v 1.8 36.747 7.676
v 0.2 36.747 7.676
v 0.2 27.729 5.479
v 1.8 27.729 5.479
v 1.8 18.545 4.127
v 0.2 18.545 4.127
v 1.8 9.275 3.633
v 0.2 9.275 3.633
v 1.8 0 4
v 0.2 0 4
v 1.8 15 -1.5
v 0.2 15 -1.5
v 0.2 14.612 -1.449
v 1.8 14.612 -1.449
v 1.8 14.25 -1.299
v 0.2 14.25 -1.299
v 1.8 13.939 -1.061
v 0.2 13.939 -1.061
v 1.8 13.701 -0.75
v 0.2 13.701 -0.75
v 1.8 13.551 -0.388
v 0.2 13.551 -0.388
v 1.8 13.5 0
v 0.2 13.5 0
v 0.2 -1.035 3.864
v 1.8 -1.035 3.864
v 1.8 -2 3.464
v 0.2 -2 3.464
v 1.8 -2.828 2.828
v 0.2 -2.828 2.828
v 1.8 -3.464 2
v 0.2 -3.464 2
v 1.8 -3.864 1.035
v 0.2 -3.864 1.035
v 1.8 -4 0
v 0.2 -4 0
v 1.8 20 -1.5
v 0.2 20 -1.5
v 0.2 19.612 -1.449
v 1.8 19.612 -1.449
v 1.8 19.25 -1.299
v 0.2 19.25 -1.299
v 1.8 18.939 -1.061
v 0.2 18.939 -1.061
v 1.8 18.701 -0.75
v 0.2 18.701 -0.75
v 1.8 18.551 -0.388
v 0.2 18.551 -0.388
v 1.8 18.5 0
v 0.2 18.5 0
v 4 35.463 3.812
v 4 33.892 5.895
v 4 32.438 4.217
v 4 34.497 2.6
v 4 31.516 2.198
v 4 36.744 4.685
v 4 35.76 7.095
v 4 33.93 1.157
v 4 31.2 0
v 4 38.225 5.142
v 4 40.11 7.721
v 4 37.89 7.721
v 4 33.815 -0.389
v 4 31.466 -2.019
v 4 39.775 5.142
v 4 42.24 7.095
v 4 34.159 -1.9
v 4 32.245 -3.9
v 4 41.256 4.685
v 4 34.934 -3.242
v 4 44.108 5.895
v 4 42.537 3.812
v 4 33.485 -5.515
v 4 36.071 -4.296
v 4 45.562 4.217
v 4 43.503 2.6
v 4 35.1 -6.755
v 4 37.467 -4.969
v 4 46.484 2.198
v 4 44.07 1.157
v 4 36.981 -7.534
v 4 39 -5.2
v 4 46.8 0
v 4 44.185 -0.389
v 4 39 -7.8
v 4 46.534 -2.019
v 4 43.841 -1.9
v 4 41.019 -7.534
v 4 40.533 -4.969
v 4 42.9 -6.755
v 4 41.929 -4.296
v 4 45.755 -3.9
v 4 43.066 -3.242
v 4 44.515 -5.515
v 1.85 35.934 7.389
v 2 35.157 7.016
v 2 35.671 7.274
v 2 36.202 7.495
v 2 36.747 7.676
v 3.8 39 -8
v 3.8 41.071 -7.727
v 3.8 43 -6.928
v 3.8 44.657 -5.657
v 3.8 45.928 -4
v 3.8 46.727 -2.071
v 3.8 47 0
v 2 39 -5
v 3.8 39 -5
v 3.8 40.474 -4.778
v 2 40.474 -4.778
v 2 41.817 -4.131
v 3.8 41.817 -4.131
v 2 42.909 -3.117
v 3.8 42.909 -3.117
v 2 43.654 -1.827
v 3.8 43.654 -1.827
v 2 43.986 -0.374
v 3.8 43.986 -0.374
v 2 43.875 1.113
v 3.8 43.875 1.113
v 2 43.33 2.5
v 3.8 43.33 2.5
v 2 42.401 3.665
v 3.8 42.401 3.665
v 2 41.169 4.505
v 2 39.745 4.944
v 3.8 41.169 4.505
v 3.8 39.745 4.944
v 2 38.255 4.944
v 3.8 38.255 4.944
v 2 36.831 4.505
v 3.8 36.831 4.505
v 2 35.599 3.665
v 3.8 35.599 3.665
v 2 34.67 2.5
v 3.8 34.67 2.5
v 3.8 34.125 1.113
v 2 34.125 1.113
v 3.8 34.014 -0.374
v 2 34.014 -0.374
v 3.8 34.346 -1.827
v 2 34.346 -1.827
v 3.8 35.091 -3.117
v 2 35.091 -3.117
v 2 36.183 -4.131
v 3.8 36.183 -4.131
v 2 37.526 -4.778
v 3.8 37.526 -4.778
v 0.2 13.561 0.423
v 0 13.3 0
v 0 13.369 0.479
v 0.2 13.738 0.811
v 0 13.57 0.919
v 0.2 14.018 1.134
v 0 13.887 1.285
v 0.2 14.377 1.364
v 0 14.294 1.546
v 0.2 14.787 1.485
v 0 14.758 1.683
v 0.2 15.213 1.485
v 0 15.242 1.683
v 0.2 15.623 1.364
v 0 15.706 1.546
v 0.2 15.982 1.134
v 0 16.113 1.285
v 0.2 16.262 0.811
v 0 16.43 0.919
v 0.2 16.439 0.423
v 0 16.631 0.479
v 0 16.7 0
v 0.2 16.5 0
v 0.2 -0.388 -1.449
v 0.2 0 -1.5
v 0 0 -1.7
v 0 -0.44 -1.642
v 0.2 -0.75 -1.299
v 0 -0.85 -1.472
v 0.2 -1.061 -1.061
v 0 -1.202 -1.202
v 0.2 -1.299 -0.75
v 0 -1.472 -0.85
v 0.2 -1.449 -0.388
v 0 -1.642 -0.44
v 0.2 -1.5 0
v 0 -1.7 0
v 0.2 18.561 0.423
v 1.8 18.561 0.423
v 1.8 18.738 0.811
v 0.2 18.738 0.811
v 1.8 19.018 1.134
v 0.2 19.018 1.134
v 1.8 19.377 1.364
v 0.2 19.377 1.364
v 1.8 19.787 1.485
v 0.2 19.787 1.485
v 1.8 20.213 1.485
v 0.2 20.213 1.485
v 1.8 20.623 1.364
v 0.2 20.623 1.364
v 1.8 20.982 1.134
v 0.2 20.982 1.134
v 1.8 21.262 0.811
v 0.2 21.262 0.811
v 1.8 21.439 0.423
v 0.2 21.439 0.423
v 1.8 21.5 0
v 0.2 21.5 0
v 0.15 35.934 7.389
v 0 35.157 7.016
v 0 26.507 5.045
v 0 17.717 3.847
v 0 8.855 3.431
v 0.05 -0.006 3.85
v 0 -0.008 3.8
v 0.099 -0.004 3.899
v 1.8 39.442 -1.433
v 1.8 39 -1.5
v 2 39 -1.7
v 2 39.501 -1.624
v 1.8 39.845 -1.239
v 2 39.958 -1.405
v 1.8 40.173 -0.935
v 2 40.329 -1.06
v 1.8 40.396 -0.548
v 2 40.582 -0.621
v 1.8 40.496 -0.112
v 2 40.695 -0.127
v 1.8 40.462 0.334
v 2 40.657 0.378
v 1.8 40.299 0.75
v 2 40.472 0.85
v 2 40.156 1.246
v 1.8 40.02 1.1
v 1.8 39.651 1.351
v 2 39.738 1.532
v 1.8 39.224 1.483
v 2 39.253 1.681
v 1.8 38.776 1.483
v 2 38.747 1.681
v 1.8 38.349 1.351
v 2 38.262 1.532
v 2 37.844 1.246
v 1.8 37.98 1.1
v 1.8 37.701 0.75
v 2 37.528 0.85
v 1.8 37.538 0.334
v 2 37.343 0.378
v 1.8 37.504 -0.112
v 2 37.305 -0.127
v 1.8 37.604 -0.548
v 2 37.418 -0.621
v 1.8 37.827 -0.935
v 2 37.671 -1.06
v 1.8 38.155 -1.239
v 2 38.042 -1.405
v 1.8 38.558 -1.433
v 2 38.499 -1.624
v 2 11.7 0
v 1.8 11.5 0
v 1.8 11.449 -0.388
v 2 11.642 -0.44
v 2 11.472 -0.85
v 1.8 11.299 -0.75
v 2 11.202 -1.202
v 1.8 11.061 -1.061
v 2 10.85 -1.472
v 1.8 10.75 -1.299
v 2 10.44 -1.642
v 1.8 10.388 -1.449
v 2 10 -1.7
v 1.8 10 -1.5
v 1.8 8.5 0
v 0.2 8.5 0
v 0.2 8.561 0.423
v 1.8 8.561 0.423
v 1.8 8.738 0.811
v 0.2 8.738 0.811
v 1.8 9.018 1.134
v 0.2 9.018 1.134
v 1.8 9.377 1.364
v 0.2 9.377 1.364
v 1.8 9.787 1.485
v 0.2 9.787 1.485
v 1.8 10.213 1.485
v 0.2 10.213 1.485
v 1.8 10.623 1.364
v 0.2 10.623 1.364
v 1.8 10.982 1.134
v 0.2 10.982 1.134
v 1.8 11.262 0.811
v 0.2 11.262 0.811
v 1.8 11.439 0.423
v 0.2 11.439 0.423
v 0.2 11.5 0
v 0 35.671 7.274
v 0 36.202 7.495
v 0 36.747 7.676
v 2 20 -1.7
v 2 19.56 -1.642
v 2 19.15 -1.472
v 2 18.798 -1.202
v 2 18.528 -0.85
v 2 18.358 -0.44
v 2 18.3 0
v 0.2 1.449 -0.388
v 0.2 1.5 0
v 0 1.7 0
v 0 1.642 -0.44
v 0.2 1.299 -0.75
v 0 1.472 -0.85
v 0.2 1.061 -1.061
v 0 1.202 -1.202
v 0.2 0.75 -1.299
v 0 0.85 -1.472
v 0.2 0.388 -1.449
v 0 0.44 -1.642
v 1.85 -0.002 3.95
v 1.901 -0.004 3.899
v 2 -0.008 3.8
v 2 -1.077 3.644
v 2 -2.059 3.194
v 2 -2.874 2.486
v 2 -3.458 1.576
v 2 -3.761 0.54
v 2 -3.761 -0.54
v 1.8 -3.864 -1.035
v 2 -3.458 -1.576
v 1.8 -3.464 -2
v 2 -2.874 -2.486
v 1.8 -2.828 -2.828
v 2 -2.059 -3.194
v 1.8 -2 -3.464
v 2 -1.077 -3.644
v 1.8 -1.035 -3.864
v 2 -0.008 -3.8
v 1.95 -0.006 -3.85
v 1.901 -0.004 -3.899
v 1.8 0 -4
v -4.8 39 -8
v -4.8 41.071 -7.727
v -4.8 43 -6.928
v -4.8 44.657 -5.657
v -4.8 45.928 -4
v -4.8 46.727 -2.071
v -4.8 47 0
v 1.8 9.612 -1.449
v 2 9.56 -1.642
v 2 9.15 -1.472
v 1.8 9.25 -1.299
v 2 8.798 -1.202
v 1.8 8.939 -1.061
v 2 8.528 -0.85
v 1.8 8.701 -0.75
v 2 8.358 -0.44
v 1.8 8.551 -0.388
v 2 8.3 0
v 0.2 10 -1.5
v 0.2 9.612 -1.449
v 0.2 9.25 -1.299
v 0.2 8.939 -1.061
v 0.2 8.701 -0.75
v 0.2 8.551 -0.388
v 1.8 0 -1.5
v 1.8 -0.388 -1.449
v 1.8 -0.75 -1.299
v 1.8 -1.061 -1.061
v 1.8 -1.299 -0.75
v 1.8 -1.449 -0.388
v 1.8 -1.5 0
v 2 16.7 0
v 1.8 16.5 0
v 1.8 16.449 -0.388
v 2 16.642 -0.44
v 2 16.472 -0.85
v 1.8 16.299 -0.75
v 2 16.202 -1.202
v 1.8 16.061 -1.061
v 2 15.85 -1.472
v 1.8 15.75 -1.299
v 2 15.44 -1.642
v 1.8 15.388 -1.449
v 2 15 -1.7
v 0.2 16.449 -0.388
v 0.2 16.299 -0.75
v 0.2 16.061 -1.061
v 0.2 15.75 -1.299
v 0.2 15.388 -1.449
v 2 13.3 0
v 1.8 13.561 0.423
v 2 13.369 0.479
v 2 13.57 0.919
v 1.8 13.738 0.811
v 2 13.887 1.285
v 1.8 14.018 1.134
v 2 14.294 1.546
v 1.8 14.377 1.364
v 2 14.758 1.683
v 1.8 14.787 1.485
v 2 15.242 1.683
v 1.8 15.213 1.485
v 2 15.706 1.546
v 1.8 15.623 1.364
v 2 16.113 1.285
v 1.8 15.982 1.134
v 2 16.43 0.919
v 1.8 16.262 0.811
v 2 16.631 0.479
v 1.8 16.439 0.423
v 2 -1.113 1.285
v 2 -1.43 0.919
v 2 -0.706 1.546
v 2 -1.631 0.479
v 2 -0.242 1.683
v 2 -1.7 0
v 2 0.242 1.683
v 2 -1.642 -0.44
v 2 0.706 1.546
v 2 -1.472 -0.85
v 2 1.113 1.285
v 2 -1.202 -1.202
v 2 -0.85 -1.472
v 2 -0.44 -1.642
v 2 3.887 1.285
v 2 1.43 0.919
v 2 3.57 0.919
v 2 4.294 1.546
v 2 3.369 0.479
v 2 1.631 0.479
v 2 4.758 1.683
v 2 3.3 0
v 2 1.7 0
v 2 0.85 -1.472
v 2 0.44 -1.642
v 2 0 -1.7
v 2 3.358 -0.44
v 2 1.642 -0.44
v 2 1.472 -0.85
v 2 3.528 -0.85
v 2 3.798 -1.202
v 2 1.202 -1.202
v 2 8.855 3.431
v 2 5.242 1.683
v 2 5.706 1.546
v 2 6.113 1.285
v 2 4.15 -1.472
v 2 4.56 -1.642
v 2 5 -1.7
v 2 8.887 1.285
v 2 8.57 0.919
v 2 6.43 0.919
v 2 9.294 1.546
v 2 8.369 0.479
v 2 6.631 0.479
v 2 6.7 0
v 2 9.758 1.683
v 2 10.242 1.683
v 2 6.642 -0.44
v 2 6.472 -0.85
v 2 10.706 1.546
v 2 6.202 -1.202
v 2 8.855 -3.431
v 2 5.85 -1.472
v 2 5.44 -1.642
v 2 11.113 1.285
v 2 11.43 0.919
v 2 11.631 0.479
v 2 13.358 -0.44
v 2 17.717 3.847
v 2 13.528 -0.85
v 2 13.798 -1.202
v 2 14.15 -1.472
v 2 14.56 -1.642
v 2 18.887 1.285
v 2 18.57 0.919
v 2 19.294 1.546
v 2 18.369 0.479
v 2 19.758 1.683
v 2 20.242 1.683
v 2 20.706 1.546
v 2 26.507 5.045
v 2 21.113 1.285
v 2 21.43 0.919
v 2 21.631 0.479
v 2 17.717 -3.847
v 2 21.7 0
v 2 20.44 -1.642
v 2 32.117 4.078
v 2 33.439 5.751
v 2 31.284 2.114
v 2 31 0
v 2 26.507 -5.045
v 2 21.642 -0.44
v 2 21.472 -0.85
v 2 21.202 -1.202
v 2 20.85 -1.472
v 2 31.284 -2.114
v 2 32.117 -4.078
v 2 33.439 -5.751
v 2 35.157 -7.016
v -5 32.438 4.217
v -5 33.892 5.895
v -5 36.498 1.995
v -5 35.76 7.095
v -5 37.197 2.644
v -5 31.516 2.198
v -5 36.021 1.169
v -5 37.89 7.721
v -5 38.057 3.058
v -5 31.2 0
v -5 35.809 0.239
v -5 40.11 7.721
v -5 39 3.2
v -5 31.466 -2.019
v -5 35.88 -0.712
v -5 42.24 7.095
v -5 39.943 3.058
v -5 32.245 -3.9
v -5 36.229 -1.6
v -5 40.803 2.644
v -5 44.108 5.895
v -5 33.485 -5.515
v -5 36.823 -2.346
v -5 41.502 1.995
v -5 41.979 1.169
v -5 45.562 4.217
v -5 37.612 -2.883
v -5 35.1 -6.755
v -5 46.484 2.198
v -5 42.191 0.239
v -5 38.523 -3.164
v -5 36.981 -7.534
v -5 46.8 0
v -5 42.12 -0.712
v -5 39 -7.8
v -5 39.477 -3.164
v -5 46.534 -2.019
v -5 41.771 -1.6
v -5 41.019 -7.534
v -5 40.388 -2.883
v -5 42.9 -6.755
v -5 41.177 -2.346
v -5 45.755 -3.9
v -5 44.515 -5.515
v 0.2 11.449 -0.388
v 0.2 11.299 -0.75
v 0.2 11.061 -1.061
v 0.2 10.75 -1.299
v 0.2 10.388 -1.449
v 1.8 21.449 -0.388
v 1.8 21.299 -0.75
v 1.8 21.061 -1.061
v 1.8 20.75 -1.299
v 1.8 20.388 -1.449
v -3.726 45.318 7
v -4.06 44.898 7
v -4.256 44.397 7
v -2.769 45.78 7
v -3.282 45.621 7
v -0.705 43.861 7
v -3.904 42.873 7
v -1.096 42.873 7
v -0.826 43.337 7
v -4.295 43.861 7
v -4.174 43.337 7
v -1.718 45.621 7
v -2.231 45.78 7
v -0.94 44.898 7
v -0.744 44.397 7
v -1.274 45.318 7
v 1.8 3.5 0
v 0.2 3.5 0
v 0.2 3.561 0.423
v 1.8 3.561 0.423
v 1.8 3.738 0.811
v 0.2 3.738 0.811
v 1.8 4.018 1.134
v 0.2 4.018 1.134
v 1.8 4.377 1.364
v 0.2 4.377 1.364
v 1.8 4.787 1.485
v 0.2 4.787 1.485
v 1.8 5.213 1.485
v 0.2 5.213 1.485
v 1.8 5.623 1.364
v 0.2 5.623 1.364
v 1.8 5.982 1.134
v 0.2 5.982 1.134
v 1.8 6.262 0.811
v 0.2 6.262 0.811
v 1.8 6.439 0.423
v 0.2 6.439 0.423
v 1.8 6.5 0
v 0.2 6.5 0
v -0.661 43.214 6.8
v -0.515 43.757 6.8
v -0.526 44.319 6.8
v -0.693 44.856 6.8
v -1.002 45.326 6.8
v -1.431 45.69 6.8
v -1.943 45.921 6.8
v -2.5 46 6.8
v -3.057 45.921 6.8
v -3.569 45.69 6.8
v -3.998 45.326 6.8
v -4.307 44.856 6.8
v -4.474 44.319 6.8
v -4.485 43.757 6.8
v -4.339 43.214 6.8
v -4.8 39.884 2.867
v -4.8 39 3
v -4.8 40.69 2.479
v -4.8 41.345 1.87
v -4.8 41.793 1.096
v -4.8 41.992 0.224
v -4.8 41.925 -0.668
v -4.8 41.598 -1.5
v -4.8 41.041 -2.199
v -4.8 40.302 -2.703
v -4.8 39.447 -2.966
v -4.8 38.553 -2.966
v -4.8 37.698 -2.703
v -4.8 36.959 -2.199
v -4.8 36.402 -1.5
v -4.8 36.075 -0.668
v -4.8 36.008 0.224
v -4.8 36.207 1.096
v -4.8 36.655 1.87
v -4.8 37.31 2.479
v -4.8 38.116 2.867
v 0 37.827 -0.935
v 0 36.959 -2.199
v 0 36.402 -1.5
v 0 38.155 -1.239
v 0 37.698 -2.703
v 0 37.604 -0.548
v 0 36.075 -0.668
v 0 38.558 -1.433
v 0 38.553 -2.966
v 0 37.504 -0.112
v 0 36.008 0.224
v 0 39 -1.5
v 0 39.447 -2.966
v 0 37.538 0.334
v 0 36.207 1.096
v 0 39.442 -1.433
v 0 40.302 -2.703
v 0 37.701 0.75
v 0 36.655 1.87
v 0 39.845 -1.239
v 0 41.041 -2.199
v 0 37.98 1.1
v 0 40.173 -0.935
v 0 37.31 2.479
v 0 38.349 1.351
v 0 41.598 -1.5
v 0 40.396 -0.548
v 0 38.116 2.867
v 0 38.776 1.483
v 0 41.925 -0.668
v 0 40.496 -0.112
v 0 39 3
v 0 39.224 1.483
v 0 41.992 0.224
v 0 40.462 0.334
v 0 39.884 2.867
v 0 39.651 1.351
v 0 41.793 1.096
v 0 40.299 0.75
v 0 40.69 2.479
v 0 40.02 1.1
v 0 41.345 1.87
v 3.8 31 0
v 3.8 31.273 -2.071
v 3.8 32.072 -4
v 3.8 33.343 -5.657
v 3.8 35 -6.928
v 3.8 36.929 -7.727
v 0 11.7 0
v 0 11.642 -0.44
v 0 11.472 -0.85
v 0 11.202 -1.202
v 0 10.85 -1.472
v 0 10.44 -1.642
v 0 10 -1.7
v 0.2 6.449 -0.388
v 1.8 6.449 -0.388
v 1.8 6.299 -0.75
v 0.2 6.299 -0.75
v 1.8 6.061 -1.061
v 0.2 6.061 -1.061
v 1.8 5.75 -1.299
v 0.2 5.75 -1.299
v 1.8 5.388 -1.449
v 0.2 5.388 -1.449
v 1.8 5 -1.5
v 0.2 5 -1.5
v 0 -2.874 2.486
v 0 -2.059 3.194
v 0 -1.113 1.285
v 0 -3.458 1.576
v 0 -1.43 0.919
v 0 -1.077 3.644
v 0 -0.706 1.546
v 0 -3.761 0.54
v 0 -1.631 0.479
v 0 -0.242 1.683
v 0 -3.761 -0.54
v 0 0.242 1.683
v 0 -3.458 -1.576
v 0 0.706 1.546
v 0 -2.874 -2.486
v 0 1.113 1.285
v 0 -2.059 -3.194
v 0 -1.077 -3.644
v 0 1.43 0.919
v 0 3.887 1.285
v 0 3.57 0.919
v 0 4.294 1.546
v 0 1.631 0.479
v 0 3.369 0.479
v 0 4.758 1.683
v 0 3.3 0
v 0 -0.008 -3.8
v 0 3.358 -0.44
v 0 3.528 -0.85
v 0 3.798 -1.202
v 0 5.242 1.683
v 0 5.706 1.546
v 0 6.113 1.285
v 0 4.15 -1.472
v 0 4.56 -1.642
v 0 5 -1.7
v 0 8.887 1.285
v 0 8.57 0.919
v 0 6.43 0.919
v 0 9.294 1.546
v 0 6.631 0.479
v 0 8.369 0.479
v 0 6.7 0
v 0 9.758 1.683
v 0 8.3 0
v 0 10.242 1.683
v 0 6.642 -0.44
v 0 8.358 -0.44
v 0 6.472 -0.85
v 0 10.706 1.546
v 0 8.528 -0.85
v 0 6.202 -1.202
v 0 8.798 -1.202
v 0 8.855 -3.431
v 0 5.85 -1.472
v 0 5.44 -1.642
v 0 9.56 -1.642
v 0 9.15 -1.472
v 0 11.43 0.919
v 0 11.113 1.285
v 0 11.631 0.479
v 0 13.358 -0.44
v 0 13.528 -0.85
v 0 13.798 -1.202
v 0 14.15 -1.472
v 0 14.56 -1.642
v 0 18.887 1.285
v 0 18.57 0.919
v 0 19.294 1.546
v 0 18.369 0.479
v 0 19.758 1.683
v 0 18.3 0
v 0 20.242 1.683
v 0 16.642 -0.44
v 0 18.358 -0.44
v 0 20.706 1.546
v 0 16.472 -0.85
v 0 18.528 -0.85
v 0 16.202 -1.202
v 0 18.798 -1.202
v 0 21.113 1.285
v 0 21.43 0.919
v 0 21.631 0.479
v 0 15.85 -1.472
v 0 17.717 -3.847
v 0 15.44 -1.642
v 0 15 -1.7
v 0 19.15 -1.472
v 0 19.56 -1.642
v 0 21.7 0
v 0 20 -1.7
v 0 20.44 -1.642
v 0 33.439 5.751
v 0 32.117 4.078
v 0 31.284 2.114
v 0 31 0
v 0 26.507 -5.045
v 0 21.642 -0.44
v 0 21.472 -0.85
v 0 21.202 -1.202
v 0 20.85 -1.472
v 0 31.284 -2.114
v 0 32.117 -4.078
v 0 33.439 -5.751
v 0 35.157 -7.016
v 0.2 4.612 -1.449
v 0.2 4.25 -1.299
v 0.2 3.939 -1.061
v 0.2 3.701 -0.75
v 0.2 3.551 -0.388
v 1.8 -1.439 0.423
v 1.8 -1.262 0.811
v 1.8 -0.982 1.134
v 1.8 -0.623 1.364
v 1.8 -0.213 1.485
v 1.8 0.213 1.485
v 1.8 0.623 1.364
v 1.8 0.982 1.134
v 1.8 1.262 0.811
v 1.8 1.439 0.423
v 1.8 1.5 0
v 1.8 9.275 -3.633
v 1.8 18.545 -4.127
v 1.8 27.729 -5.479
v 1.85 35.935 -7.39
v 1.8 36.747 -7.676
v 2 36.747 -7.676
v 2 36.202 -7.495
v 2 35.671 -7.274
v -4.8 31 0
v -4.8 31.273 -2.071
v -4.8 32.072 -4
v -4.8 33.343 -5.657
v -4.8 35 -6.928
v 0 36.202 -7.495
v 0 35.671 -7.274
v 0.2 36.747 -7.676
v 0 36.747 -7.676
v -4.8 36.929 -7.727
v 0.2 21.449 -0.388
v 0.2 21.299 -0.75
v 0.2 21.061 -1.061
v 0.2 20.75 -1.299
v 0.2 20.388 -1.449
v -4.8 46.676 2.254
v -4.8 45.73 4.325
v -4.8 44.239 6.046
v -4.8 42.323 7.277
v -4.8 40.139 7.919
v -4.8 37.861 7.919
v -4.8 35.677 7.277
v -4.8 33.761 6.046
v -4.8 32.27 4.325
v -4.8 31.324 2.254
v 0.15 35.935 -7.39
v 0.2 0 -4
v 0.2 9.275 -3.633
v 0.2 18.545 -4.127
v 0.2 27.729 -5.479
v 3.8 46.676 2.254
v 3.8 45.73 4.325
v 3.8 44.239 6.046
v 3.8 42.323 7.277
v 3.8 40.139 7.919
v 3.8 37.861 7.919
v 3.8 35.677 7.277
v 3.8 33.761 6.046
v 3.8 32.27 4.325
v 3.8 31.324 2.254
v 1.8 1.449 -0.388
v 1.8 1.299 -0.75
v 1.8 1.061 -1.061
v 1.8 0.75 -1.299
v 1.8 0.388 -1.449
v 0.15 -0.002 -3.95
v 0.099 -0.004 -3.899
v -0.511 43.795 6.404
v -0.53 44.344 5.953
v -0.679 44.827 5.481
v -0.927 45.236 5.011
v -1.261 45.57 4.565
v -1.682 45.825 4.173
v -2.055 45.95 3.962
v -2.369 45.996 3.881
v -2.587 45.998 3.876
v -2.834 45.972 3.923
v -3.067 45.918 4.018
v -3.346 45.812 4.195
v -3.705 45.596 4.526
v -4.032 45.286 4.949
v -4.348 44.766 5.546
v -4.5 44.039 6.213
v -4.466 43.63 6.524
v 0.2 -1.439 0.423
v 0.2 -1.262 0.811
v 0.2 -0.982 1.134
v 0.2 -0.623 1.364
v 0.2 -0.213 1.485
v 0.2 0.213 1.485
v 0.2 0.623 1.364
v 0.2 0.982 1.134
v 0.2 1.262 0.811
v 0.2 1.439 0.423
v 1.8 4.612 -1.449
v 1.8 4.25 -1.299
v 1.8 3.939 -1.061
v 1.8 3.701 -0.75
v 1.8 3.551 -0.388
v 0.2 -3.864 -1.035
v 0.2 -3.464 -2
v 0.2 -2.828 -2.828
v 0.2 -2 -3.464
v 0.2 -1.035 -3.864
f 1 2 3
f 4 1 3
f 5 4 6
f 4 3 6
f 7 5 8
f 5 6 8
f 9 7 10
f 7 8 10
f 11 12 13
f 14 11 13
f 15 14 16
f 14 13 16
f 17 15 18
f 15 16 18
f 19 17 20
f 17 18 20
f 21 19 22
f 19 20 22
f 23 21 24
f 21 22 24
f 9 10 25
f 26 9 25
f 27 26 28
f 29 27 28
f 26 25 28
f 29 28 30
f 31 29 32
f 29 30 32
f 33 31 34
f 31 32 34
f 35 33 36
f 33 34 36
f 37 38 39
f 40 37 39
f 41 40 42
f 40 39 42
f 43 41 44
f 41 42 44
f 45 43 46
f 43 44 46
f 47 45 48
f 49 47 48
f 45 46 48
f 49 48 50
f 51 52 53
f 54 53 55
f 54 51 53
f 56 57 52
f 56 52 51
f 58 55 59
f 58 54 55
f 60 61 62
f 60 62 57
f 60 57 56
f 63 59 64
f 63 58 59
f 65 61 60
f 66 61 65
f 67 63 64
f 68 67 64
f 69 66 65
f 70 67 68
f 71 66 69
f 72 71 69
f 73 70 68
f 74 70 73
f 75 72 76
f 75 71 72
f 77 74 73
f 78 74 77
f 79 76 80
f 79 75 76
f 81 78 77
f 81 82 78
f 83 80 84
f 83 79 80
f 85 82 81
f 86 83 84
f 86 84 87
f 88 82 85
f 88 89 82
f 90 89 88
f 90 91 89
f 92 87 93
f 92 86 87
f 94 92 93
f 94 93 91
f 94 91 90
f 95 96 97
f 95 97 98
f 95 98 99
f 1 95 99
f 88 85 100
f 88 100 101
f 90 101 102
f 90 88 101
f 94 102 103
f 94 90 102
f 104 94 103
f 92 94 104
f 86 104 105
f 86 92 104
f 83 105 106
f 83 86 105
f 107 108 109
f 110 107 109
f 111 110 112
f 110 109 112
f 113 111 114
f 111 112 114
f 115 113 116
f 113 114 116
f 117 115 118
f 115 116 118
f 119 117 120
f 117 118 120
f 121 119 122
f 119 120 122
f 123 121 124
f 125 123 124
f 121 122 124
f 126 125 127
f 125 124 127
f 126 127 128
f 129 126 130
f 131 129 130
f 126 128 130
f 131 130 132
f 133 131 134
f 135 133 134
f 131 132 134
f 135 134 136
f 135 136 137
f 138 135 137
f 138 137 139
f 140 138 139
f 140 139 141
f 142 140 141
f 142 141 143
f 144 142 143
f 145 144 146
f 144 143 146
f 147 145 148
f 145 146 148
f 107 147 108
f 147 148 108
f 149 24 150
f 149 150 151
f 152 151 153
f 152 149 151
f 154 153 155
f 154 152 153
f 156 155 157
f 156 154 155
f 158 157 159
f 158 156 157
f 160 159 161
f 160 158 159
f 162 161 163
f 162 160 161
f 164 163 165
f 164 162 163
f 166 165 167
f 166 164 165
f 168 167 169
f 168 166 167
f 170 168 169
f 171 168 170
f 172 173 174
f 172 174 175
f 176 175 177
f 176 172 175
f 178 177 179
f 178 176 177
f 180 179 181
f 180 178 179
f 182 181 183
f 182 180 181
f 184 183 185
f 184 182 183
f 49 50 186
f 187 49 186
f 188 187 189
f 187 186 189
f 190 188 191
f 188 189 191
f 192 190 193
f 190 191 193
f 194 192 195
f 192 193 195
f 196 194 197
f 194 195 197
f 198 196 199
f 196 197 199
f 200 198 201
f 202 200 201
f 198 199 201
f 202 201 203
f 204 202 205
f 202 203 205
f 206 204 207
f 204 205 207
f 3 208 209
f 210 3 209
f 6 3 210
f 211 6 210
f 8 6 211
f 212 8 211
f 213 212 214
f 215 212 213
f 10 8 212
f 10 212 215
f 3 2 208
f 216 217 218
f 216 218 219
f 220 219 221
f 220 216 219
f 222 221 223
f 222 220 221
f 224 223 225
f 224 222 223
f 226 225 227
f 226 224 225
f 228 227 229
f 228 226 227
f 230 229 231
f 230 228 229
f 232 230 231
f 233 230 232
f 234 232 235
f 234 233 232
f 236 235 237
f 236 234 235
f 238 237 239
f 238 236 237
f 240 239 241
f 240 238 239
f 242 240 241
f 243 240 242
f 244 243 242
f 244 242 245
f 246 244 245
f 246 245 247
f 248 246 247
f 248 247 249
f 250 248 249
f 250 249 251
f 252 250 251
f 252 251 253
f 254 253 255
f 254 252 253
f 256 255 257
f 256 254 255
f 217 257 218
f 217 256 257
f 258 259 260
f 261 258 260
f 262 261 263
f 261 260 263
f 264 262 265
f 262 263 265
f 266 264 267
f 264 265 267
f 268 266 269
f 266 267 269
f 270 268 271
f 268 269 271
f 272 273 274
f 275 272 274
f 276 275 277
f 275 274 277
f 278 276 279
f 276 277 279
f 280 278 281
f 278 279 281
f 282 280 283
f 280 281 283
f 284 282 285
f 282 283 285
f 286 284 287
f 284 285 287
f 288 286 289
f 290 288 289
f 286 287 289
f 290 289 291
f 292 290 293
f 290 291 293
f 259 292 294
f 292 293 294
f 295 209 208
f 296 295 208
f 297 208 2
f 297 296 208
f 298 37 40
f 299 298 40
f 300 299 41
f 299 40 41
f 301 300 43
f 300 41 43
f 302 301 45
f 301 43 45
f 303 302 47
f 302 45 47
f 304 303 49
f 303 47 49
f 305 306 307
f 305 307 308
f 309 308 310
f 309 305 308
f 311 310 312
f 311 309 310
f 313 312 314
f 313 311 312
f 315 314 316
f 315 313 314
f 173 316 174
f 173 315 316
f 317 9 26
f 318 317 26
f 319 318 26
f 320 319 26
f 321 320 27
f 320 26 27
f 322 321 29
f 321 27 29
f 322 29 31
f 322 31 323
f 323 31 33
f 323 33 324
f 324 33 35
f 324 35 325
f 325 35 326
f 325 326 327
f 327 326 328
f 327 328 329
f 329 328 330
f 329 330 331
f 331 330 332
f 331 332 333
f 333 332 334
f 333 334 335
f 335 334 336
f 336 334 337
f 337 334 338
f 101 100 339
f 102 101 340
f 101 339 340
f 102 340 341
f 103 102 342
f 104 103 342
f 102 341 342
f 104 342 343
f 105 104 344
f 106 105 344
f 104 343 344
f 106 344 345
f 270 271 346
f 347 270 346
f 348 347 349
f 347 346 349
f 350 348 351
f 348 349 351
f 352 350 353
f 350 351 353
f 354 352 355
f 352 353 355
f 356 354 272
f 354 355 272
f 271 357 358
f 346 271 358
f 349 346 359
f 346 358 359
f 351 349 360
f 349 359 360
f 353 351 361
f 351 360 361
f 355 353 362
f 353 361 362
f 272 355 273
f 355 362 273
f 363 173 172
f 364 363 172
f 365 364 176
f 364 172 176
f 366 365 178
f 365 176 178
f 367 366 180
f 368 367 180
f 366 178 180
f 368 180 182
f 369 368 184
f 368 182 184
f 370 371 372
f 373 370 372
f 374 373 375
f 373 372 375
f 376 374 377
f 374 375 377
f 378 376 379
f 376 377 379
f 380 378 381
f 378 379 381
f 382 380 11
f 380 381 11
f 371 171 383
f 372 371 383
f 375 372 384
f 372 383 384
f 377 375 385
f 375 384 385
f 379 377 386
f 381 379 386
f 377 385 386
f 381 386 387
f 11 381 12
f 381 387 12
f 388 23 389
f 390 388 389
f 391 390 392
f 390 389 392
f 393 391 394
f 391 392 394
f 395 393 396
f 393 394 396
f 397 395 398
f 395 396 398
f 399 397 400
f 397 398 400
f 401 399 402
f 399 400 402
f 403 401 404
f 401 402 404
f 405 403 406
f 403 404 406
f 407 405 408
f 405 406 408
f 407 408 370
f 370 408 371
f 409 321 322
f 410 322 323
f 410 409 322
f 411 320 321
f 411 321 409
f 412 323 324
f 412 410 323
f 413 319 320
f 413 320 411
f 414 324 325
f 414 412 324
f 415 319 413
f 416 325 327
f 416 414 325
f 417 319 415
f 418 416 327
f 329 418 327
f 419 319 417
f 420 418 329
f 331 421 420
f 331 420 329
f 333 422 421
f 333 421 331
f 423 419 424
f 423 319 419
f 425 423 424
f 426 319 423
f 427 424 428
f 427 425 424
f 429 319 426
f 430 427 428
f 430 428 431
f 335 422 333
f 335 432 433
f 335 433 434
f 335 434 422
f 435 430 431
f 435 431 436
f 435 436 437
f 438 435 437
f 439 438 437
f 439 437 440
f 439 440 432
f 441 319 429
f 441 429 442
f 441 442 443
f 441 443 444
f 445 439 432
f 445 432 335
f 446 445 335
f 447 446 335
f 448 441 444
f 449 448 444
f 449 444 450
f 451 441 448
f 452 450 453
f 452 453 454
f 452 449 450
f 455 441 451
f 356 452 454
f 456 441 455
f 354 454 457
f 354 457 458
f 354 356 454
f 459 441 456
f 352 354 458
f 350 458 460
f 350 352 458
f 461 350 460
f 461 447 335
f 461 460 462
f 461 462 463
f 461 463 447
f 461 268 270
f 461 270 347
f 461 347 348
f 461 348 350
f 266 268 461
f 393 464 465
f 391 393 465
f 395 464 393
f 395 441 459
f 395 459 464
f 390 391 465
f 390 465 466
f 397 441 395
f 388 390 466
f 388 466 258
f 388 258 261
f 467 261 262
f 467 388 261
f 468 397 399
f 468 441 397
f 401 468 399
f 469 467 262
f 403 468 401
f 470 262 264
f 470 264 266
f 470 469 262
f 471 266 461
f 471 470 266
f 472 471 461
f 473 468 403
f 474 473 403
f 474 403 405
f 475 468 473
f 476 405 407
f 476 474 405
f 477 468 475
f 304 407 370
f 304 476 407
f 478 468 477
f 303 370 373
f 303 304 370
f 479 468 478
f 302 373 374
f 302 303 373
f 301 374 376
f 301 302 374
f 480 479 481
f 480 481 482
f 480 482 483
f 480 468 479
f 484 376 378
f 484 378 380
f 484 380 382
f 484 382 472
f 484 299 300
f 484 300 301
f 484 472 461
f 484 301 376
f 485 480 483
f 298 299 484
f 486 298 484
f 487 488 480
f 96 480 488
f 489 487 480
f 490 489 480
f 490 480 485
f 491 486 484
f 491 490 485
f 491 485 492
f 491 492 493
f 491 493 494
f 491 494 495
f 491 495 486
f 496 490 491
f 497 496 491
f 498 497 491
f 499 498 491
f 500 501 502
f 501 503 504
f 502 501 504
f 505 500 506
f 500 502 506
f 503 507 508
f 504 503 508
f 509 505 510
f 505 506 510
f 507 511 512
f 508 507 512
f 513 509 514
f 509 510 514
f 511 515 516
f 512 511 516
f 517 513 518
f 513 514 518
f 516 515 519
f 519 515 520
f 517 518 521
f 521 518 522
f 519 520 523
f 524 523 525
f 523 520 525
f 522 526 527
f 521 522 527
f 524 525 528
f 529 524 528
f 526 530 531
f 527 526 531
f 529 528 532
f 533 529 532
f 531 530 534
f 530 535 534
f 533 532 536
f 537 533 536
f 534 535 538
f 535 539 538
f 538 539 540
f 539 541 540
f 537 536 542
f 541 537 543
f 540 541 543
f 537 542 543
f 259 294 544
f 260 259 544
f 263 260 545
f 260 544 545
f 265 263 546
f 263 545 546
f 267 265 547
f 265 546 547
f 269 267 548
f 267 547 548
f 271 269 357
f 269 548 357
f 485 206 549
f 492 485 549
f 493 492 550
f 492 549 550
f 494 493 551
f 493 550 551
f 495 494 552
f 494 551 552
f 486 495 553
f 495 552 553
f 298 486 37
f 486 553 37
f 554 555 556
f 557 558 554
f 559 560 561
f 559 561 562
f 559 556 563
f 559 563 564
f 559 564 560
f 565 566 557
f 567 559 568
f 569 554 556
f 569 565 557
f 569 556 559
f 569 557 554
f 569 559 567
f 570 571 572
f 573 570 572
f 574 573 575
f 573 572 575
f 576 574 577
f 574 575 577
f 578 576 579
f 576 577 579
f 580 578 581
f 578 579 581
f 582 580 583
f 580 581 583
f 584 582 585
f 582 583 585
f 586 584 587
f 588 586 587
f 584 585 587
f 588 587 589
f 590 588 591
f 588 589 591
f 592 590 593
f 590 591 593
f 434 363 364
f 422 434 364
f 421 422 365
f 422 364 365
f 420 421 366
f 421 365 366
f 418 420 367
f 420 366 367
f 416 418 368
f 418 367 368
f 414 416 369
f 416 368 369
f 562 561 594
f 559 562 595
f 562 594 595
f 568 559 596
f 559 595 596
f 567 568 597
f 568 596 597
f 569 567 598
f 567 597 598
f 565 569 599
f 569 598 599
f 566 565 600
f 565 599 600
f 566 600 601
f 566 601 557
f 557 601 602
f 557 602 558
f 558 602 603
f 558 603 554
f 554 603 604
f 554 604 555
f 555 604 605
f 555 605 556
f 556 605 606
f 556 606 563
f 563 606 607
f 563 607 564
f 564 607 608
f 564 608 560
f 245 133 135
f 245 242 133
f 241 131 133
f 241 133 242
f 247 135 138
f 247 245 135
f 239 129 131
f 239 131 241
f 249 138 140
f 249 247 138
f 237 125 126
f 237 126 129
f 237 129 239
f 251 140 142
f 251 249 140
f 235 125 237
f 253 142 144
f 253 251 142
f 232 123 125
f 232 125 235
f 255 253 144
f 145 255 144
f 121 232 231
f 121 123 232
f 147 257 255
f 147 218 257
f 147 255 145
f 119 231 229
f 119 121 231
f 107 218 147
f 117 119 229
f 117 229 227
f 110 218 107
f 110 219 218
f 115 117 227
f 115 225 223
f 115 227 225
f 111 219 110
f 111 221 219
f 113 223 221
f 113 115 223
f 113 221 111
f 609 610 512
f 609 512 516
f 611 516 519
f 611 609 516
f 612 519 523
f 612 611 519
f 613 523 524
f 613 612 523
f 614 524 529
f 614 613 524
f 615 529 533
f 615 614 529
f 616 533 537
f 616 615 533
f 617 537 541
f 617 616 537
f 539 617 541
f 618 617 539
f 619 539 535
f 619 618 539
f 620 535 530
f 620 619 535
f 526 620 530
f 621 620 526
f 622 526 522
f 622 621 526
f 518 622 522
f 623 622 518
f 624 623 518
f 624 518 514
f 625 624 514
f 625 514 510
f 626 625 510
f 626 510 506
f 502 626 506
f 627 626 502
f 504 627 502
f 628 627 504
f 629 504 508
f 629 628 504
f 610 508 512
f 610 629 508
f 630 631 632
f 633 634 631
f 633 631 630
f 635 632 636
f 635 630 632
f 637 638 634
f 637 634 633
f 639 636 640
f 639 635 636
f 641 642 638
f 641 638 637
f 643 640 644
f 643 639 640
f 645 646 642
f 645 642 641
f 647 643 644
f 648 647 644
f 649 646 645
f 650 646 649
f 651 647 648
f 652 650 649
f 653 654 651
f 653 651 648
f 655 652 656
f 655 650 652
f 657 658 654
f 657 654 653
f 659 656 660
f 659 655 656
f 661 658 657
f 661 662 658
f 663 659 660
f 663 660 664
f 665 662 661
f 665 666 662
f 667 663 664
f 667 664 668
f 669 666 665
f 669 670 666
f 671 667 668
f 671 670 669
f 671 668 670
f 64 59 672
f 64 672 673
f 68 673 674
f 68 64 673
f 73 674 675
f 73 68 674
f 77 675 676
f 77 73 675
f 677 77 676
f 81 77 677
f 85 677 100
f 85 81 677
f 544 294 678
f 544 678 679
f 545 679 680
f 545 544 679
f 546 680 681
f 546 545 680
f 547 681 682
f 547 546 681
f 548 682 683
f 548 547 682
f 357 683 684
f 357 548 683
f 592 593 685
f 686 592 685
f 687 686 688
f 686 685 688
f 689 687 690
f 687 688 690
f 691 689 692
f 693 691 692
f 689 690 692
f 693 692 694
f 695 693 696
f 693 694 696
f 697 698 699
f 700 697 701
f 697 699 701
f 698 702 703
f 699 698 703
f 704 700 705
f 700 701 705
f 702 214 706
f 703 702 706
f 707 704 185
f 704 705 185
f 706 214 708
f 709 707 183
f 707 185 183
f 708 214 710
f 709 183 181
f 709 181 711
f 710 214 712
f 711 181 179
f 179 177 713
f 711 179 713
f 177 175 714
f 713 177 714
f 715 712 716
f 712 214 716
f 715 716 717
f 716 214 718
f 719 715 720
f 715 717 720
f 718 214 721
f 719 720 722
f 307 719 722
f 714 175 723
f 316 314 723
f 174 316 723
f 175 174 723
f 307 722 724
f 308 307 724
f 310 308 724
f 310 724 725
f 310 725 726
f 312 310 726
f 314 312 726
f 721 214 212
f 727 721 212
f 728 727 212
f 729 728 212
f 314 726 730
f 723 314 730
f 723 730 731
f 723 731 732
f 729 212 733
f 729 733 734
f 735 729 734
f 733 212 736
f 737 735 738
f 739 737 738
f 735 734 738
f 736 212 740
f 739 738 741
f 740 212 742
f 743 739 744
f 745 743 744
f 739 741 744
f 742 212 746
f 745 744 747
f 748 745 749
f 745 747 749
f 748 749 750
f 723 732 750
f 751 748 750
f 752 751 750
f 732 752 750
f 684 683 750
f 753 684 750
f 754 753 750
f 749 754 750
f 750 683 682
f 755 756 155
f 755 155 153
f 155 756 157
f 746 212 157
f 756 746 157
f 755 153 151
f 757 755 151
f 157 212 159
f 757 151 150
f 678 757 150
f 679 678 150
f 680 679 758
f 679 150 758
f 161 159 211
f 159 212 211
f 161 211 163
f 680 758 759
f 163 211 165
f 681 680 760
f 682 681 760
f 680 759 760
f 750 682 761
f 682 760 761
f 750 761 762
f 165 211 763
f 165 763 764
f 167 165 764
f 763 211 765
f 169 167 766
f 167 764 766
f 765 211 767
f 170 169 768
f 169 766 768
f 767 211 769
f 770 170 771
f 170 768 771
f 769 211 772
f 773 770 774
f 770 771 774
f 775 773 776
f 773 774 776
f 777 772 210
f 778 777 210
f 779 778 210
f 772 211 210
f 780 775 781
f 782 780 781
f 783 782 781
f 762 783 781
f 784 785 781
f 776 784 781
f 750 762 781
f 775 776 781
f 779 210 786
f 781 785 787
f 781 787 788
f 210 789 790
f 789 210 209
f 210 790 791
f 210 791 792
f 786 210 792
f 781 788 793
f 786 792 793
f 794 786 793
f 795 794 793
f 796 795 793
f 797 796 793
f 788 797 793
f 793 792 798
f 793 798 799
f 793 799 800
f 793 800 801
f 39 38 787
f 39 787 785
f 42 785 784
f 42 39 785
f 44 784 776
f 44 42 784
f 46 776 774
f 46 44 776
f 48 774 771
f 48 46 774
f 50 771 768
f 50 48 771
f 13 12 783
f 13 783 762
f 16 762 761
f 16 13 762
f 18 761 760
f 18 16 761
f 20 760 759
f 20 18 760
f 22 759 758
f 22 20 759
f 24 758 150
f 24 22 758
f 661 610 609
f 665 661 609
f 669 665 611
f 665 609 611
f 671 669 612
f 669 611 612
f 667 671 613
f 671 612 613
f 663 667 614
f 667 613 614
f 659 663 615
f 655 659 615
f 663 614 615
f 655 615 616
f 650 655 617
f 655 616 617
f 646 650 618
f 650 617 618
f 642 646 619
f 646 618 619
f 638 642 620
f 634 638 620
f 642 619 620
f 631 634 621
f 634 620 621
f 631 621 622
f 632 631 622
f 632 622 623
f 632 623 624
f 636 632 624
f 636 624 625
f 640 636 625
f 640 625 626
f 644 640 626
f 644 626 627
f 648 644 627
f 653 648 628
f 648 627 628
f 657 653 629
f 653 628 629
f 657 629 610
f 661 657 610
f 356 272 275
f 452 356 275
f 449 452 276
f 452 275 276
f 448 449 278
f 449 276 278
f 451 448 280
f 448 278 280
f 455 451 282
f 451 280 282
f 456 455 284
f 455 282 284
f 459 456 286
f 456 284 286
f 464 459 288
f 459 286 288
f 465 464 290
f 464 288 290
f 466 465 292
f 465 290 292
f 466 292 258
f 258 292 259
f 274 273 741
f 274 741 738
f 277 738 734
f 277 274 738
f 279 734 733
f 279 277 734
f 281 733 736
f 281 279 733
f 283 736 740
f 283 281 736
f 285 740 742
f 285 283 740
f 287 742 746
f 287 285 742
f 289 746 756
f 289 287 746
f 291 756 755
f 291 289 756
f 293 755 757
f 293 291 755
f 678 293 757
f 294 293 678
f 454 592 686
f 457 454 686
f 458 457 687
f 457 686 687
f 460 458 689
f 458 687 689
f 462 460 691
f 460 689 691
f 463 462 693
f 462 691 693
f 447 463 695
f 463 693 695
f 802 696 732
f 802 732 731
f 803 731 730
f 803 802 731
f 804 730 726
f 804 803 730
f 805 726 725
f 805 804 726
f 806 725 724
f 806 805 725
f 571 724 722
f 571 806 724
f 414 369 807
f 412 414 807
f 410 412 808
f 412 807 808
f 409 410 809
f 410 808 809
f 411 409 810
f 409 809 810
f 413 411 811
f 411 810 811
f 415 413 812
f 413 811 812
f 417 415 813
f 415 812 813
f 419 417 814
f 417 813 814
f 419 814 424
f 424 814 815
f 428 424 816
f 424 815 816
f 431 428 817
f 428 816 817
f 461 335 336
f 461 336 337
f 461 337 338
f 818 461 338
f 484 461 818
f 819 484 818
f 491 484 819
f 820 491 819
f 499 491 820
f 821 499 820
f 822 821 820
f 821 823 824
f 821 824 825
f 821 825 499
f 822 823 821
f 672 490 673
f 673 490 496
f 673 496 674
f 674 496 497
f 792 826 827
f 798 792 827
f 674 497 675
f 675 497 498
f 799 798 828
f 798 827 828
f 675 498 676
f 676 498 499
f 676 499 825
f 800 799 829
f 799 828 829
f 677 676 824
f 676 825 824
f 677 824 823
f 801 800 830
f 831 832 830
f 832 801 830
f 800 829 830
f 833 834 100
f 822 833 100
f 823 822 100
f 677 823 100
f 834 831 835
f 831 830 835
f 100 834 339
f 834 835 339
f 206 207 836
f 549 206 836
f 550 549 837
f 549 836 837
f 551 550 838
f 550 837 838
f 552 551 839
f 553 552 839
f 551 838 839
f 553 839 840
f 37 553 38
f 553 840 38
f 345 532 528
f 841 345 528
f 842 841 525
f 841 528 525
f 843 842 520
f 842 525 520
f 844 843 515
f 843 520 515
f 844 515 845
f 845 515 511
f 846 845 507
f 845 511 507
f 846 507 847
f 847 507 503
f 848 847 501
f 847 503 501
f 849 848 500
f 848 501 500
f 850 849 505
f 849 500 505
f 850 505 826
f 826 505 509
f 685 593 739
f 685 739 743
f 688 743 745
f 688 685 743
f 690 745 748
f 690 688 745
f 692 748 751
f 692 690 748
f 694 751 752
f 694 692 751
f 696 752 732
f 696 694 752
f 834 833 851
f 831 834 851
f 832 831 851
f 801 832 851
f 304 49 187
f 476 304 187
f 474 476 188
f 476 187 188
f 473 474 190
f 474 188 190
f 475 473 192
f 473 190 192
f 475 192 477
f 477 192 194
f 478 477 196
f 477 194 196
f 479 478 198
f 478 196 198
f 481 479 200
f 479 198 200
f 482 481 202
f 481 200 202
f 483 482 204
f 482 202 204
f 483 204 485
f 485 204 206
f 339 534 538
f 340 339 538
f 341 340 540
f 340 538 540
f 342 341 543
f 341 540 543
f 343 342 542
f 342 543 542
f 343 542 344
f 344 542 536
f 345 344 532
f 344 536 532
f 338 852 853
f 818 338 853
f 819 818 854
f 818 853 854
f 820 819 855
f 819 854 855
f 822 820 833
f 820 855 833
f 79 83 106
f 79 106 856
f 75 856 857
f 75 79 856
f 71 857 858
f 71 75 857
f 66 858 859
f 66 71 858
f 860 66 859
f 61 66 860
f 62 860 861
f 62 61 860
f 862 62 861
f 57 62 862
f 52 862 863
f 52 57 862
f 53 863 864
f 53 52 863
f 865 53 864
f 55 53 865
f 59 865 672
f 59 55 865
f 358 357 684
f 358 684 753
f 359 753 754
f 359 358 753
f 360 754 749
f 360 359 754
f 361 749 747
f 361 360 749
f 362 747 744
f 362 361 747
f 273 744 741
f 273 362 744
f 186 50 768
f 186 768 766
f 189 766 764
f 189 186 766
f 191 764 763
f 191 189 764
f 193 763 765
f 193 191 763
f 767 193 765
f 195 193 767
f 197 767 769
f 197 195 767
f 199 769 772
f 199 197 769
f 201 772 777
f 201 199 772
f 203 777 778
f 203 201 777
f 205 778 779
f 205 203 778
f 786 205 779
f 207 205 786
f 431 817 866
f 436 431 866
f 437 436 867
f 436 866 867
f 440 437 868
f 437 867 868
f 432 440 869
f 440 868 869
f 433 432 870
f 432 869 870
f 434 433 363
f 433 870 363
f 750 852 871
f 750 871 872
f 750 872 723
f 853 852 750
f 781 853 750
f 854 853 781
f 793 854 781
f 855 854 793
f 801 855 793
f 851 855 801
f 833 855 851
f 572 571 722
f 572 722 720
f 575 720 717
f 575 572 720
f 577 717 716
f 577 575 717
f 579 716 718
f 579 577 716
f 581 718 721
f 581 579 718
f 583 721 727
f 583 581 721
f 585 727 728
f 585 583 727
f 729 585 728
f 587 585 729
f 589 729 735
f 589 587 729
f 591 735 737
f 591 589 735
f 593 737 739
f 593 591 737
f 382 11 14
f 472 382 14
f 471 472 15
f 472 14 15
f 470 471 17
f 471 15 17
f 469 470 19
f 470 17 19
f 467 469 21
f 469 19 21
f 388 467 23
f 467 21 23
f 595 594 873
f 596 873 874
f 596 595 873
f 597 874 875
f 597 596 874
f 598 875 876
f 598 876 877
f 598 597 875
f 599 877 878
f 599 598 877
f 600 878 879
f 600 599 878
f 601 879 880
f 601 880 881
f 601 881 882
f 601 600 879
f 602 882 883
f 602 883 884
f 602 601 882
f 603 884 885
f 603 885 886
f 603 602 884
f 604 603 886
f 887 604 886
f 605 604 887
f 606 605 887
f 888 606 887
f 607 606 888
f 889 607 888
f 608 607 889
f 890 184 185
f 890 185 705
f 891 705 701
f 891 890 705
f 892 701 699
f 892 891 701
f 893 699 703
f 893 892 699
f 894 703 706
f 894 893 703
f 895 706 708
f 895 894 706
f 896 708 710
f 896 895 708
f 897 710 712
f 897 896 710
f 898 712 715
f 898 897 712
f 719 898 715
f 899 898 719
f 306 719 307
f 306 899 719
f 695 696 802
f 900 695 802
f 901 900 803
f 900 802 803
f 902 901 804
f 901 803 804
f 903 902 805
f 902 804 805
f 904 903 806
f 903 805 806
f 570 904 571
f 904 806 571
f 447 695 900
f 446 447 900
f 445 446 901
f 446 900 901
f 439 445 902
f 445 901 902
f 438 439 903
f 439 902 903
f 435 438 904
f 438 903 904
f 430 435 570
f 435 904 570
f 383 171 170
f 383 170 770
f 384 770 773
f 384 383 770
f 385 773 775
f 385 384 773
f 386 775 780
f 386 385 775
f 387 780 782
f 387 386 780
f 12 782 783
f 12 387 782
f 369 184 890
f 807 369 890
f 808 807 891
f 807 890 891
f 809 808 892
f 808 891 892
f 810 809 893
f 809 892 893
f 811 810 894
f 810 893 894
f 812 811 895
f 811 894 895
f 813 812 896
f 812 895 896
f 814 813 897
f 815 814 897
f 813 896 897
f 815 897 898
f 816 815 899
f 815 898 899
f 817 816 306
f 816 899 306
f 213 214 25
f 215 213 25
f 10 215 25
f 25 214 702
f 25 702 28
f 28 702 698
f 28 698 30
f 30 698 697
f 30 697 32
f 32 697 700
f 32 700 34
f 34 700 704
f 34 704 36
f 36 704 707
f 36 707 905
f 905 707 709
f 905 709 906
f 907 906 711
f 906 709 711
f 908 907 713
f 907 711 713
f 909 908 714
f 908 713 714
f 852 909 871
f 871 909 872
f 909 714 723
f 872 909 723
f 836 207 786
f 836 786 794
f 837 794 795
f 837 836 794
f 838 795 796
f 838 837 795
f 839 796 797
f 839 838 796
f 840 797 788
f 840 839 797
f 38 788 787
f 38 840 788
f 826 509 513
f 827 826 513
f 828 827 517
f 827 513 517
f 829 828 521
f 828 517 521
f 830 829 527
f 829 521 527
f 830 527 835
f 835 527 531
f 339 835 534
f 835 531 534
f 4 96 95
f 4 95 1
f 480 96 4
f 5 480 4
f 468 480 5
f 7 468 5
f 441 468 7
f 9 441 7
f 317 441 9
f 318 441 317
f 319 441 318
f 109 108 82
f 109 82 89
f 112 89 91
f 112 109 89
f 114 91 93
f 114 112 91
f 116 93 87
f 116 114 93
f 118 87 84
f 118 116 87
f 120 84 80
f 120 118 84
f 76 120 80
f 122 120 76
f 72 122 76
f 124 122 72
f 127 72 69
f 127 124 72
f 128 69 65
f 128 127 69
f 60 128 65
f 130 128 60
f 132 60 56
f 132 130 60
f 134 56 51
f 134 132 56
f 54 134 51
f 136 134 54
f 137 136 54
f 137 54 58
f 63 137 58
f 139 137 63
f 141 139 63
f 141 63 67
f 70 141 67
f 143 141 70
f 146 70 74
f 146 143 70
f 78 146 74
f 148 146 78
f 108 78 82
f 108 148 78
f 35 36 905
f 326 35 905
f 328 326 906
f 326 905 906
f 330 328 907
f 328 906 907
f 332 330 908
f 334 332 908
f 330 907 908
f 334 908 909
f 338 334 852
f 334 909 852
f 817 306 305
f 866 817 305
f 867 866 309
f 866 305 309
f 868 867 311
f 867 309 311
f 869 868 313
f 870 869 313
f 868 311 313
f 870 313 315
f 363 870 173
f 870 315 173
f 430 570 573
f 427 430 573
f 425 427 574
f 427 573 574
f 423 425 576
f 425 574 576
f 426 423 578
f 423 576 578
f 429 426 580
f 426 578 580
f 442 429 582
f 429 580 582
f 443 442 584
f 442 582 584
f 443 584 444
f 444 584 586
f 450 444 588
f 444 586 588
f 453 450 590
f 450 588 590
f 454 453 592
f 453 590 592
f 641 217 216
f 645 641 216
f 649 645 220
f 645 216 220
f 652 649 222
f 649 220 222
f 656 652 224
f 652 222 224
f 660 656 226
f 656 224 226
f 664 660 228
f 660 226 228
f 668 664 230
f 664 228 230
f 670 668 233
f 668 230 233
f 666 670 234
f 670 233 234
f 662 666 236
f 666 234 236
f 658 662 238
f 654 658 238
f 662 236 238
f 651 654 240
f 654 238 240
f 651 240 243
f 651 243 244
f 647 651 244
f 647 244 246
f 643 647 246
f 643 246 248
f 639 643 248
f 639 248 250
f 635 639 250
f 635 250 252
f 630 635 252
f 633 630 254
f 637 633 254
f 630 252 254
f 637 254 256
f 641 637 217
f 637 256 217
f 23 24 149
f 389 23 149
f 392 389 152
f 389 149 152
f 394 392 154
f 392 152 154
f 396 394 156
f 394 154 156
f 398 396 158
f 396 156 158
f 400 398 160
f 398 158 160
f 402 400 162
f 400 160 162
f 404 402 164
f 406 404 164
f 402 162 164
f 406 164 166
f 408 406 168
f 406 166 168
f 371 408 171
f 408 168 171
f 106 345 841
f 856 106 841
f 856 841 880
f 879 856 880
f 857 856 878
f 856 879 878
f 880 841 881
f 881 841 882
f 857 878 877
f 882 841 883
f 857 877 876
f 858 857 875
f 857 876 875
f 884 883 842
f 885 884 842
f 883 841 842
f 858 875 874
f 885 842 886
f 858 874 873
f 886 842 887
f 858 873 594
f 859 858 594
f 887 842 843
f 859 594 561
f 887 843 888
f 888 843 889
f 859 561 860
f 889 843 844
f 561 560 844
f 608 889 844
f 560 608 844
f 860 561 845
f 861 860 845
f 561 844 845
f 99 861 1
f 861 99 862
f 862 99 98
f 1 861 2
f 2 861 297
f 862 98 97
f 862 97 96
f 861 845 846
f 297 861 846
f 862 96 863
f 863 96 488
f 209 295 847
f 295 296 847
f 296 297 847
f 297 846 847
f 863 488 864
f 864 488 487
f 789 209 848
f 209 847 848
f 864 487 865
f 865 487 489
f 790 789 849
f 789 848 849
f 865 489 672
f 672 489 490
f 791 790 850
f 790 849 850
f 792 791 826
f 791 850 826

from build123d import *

# Parameters (mm, degrees)
EXTRUDE_1_DEPTH      = 2
EXTRUDE_2_DEPTH      = 4
EXTRUDE_2_DEPTH_BACK = 5
SKETCH_3_R           = 5
CUT_EXTRUDE_1_DEPTH  = 2
SKETCH_4_R           = 1.5
CUT_EXTRUDE_2_DEPTH  = 2
SKETCH_5_R           = 3
CUT_EXTRUDE_3_DEPTH  = 5
EXTRUDE_3_REACH      = 51.588
CHAMFER_1_SIZE       = 0.2
CHAMFER_2_SIZE       = 0.2
CHAMFER_3_SIZE       = 0.2
CHAMFER_4_ANGLE      = 180
CHAMFER_5_SIZE       = 0.2


with BuildPart() as part:
    # 草图1 → 凸台-拉伸1 (new body)
    with BuildSketch(Plane(origin=(0, 0, 0), x_dir=(0, 0, -1), z_dir=(1, 0, 0))):
        with BuildLine():
            ThreePointArc((-4, 0), (-2.828427125, -2.828427125), (0, -4))
            Line((0, -4), (0, -1.5))
            ThreePointArc((0, -1.5), (-1.5, 0), (0, 1.5))
            Line((0, 1.5), (0, 3.5))
            ThreePointArc((0, 3.5), (-1.5, 5), (0, 6.5))
            Line((0, 6.5), (0, 8.5))
            ThreePointArc((0, 8.5), (-1.5, 10), (0, 11.5))
            Line((0, 11.5), (0, 13.5))
            ThreePointArc((0, 13.5), (-1.5, 15), (0, 16.5))
            Line((0, 16.5), (0, 18.5))
            ThreePointArc((0, 18.5), (-1.5, 20), (0, 21.5))
            Line((0, 21.5), (0, 31))
            ThreePointArc((0, 31), (-4.794759251, 32.596072789), (-7.67632231, 36.747429069))
            ThreePointArc((-7.67632231, 36.747429069), (-4.127055678, 18.544898625), (-4, 0))
        make_face()
        with BuildLine():
            Line((0, -1.5), (0, -4))
            ThreePointArc((0, -4), (2.828427125, -2.828427125), (4, 0))
            ThreePointArc((4, 0), (4.127055678, 18.544898625), (7.67632231, 36.747429069))
            ThreePointArc((7.67632231, 36.747429069), (4.794759251, 32.596072789), (0, 31))
            Line((0, 31), (0, 21.5))
            ThreePointArc((0, 21.5), (1.060660172, 21.060660172), (1.5, 20))
            ThreePointArc((1.5, 20), (1.060660172, 18.939339828), (0, 18.5))
            Line((0, 18.5), (0, 16.5))
            ThreePointArc((0, 16.5), (1.060660172, 16.060660172), (1.5, 15))
            ThreePointArc((1.5, 15), (1.060660172, 13.939339828), (0, 13.5))
            Line((0, 13.5), (0, 11.5))
            ThreePointArc((0, 11.5), (1.060660172, 11.060660172), (1.5, 10))
            ThreePointArc((1.5, 10), (1.060660172, 8.939339828), (0, 8.5))
            Line((0, 8.5), (0, 6.5))
            ThreePointArc((0, 6.5), (1.060660172, 6.060660172), (1.5, 5))
            ThreePointArc((1.5, 5), (1.060660172, 3.939339828), (0, 3.5))
            Line((0, 3.5), (0, 1.5))
            ThreePointArc((0, 1.5), (1.060660172, 1.060660172), (1.5, 0))
            ThreePointArc((1.5, 0), (1.060660172, -1.060660172), (0, -1.5))
        make_face()
    extrude(amount=EXTRUDE_1_DEPTH)

    # 草图2 → 凸台-拉伸2 (add, two sides: drawn at the far end of the back side and taken through both)
    with BuildSketch(Plane(origin=(0, 0, 0), x_dir=(0, 0, -1), z_dir=(1, 0, 0)).offset(-EXTRUDE_2_DEPTH_BACK)):
        with BuildLine():
            ThreePointArc((0, 47), (-8, 39), (0, 31))
            Line((0, 31), (0, 47))
        make_face()
        with BuildLine():
            Line((0, 47), (0, 31))
            ThreePointArc((0, 31), (5.656854249, 33.343145751), (8, 39))
            ThreePointArc((8, 39), (5.656854249, 44.656854249), (0, 47))
        make_face()
    extrude(amount=EXTRUDE_2_DEPTH + EXTRUDE_2_DEPTH_BACK)

    # 草图3 → 切除-拉伸1 (cut)
    with BuildSketch(Plane(origin=(4, 0, 0), x_dir=(0, 0, -1), z_dir=(1, 0, 0))):
        with Locations((0, 39)):
            Circle(SKETCH_3_R)
    extrude(amount=-CUT_EXTRUDE_1_DEPTH, mode=Mode.SUBTRACT)

    # 草图4 → 切除-拉伸2 (cut)
    with BuildSketch(Plane(origin=(2, 0, 0), x_dir=(0, 0, -1), z_dir=(1, 0, 0))):
        with Locations((0, 39)):
            Circle(SKETCH_4_R)
    extrude(amount=-CUT_EXTRUDE_2_DEPTH, mode=Mode.SUBTRACT)

    # 草图5 → 切除-拉伸3 (cut)
    with BuildSketch(Plane.ZY.offset(5)):
        with Locations((0, 39)):
            Circle(SKETCH_5_R)
    extrude(amount=-CUT_EXTRUDE_3_DEPTH, mode=Mode.SUBTRACT)

    # 草图7 → 凸台-拉伸3 (add, up to next)
    with BuildSketch(Plane.XY.offset(7), mode=Mode.PRIVATE) as extrude_3_sk1:
        with BuildLine():
            Line((-4.005881134, 42.683822956), (-0.994118866, 42.683822956))
            ThreePointArc((-0.994118866, 42.683822956), (-2.5, 46), (-4.005881134, 42.683822956))
        make_face()
    extrude_3_tool1 = extrude(extrude_3_sk1.sketch, amount=-EXTRUDE_3_REACH, mode=Mode.PRIVATE) - part.part
    add(extrude_3_tool1.solids().sort_by_distance((-2.5, 44.204391, 7))[0])

    # 倒角1
    chamfer_1_edges = [part.edges().sort_by_distance(p)[0] for p in [
        (-5, 39, -3),
        (4, 31, 0),
        (-5, 31, 0),
        (-2.5, 46, 7),
        (4, 39, 5),
    ]]
    chamfer(chamfer_1_edges, length=CHAMFER_1_SIZE)

    # 倒角2
    chamfer_2_edges = [part.edges().sort_by_distance(p)[0] for p in [
        (2, 1.5, 0),
        (0, 21.5, 0),
        (0, 16.5, 0),
        (0, 11.5, 0),
        (2, 6.5, 0),
        (0, 6.5, 0),
        (0, 1.5, 0),
        (2, 11.5, 0),
        (2, 16.5, 0),
        (2, 21.5, 0),
    ]]
    chamfer(chamfer_2_edges, length=CHAMFER_2_SIZE)

    # 倒角3
    # the kernel refuses this chamfer: 0.2 mm, written as the material it takes off along each edge
    with BuildSketch(Plane(origin=(0, 8.590292429, 103.630351179), x_dir=(0, 0.3061524264248754, -0.9519825060336777), z_dir=(0, 0.9519825060336777, 0.3061524264248754))) as chamfer_3_piece_1_section:
        Polygon((100 + CHAMFER_3_SIZE, 0), (100, -CHAMFER_3_SIZE), (100, 0), align=None)
    chamfer_3_piece_1 = revolve(axis=Axis((0, 8.590292429, 103.630351179), (-1, 0, 0)), revolution_arc=23.639557958, mode=Mode.PRIVATE)
    chamfer_3_piece_1 = chamfer_3_piece_1 - Plane(origin=(0, 39, 0), x_dir=(0, 1, 0), z_dir=(-1, 0, 0)) * Cylinder(8, 401, mode=Mode.PRIVATE)
    add(chamfer_3_piece_1, mode=Mode.SUBTRACT)
    with BuildSketch(Plane(origin=(0, 8.590292429, -103.630351179), x_dir=(0, -0.10126549371899889, 0.9948594371979629), z_dir=(0, -0.9948594371979629, -0.10126549371899889))) as chamfer_3_piece_2_section:
        Polygon((100 + CHAMFER_3_SIZE, 0), (100, -CHAMFER_3_SIZE), (100, 0), align=None)
    chamfer_3_piece_2 = revolve(axis=Axis((0, 8.590292429, -103.630351179), (-1, 0, 0)), revolution_arc=23.639557958, mode=Mode.PRIVATE)
    chamfer_3_piece_2 = chamfer_3_piece_2 - Plane(origin=(0, 39, 0), x_dir=(0, 1, 0), z_dir=(-1, 0, 0)) * Cylinder(8, 401, mode=Mode.PRIVATE)
    add(chamfer_3_piece_2, mode=Mode.SUBTRACT)
    with BuildSketch(Plane(origin=(2, 8.590292429, -103.630351179), x_dir=(0, -0.10126549371899889, 0.9948594371979629), z_dir=(0, -0.9948594371979629, -0.10126549371899889))) as chamfer_3_piece_3_section:
        Polygon((100, CHAMFER_3_SIZE), (100 + CHAMFER_3_SIZE, 0), (100, 0), align=None)
    chamfer_3_piece_3 = revolve(axis=Axis((2, 8.590292429, -103.630351179), (-1, 0, 0)), revolution_arc=23.639557958, mode=Mode.PRIVATE)
    chamfer_3_piece_3 = chamfer_3_piece_3 - Plane(origin=(2, 39, 0), x_dir=(0, 1, 0), z_dir=(-1, 0, 0)) * Cylinder(8, 401, mode=Mode.PRIVATE)
    add(chamfer_3_piece_3, mode=Mode.SUBTRACT)
    with BuildSketch(Plane(origin=(2, 8.590292429, 103.630351179), x_dir=(0, 0.3061524264248754, -0.9519825060336777), z_dir=(0, 0.9519825060336777, 0.3061524264248754))) as chamfer_3_piece_4_section:
        Polygon((100, CHAMFER_3_SIZE), (100 + CHAMFER_3_SIZE, 0), (100, 0), align=None)
    chamfer_3_piece_4 = revolve(axis=Axis((2, 8.590292429, 103.630351179), (-1, 0, 0)), revolution_arc=23.639557958, mode=Mode.PRIVATE)
    chamfer_3_piece_4 = chamfer_3_piece_4 - Plane(origin=(2, 39, 0), x_dir=(0, 1, 0), z_dir=(-1, 0, 0)) * Cylinder(8, 401, mode=Mode.PRIVATE)
    add(chamfer_3_piece_4, mode=Mode.SUBTRACT)

    # 倒角4: read off the stored shape, not the designer's step
    # 倒角4 outline → 倒角4 (revolve, cut)
    with BuildSketch(Plane.ZX):
        Polygon((4, 2), (3.8, 2), (4, 1.8), align=None)
        Polygon((4, 0), (4, 0.2), (3.8, 0), align=None)
    revolve(axis=Axis((0, 0, 0), (1, 0, 0)), revolution_arc=CHAMFER_4_ANGLE, mode=Mode.SUBTRACT)

    # 倒角5
    chamfer_5_edges = [part.edges().sort_by_distance(p)[0] for p in [
        (2, 39, 1.5),
    ]]
    chamfer(chamfer_5_edges, length=CHAMFER_5_SIZE)


solid = part.part
